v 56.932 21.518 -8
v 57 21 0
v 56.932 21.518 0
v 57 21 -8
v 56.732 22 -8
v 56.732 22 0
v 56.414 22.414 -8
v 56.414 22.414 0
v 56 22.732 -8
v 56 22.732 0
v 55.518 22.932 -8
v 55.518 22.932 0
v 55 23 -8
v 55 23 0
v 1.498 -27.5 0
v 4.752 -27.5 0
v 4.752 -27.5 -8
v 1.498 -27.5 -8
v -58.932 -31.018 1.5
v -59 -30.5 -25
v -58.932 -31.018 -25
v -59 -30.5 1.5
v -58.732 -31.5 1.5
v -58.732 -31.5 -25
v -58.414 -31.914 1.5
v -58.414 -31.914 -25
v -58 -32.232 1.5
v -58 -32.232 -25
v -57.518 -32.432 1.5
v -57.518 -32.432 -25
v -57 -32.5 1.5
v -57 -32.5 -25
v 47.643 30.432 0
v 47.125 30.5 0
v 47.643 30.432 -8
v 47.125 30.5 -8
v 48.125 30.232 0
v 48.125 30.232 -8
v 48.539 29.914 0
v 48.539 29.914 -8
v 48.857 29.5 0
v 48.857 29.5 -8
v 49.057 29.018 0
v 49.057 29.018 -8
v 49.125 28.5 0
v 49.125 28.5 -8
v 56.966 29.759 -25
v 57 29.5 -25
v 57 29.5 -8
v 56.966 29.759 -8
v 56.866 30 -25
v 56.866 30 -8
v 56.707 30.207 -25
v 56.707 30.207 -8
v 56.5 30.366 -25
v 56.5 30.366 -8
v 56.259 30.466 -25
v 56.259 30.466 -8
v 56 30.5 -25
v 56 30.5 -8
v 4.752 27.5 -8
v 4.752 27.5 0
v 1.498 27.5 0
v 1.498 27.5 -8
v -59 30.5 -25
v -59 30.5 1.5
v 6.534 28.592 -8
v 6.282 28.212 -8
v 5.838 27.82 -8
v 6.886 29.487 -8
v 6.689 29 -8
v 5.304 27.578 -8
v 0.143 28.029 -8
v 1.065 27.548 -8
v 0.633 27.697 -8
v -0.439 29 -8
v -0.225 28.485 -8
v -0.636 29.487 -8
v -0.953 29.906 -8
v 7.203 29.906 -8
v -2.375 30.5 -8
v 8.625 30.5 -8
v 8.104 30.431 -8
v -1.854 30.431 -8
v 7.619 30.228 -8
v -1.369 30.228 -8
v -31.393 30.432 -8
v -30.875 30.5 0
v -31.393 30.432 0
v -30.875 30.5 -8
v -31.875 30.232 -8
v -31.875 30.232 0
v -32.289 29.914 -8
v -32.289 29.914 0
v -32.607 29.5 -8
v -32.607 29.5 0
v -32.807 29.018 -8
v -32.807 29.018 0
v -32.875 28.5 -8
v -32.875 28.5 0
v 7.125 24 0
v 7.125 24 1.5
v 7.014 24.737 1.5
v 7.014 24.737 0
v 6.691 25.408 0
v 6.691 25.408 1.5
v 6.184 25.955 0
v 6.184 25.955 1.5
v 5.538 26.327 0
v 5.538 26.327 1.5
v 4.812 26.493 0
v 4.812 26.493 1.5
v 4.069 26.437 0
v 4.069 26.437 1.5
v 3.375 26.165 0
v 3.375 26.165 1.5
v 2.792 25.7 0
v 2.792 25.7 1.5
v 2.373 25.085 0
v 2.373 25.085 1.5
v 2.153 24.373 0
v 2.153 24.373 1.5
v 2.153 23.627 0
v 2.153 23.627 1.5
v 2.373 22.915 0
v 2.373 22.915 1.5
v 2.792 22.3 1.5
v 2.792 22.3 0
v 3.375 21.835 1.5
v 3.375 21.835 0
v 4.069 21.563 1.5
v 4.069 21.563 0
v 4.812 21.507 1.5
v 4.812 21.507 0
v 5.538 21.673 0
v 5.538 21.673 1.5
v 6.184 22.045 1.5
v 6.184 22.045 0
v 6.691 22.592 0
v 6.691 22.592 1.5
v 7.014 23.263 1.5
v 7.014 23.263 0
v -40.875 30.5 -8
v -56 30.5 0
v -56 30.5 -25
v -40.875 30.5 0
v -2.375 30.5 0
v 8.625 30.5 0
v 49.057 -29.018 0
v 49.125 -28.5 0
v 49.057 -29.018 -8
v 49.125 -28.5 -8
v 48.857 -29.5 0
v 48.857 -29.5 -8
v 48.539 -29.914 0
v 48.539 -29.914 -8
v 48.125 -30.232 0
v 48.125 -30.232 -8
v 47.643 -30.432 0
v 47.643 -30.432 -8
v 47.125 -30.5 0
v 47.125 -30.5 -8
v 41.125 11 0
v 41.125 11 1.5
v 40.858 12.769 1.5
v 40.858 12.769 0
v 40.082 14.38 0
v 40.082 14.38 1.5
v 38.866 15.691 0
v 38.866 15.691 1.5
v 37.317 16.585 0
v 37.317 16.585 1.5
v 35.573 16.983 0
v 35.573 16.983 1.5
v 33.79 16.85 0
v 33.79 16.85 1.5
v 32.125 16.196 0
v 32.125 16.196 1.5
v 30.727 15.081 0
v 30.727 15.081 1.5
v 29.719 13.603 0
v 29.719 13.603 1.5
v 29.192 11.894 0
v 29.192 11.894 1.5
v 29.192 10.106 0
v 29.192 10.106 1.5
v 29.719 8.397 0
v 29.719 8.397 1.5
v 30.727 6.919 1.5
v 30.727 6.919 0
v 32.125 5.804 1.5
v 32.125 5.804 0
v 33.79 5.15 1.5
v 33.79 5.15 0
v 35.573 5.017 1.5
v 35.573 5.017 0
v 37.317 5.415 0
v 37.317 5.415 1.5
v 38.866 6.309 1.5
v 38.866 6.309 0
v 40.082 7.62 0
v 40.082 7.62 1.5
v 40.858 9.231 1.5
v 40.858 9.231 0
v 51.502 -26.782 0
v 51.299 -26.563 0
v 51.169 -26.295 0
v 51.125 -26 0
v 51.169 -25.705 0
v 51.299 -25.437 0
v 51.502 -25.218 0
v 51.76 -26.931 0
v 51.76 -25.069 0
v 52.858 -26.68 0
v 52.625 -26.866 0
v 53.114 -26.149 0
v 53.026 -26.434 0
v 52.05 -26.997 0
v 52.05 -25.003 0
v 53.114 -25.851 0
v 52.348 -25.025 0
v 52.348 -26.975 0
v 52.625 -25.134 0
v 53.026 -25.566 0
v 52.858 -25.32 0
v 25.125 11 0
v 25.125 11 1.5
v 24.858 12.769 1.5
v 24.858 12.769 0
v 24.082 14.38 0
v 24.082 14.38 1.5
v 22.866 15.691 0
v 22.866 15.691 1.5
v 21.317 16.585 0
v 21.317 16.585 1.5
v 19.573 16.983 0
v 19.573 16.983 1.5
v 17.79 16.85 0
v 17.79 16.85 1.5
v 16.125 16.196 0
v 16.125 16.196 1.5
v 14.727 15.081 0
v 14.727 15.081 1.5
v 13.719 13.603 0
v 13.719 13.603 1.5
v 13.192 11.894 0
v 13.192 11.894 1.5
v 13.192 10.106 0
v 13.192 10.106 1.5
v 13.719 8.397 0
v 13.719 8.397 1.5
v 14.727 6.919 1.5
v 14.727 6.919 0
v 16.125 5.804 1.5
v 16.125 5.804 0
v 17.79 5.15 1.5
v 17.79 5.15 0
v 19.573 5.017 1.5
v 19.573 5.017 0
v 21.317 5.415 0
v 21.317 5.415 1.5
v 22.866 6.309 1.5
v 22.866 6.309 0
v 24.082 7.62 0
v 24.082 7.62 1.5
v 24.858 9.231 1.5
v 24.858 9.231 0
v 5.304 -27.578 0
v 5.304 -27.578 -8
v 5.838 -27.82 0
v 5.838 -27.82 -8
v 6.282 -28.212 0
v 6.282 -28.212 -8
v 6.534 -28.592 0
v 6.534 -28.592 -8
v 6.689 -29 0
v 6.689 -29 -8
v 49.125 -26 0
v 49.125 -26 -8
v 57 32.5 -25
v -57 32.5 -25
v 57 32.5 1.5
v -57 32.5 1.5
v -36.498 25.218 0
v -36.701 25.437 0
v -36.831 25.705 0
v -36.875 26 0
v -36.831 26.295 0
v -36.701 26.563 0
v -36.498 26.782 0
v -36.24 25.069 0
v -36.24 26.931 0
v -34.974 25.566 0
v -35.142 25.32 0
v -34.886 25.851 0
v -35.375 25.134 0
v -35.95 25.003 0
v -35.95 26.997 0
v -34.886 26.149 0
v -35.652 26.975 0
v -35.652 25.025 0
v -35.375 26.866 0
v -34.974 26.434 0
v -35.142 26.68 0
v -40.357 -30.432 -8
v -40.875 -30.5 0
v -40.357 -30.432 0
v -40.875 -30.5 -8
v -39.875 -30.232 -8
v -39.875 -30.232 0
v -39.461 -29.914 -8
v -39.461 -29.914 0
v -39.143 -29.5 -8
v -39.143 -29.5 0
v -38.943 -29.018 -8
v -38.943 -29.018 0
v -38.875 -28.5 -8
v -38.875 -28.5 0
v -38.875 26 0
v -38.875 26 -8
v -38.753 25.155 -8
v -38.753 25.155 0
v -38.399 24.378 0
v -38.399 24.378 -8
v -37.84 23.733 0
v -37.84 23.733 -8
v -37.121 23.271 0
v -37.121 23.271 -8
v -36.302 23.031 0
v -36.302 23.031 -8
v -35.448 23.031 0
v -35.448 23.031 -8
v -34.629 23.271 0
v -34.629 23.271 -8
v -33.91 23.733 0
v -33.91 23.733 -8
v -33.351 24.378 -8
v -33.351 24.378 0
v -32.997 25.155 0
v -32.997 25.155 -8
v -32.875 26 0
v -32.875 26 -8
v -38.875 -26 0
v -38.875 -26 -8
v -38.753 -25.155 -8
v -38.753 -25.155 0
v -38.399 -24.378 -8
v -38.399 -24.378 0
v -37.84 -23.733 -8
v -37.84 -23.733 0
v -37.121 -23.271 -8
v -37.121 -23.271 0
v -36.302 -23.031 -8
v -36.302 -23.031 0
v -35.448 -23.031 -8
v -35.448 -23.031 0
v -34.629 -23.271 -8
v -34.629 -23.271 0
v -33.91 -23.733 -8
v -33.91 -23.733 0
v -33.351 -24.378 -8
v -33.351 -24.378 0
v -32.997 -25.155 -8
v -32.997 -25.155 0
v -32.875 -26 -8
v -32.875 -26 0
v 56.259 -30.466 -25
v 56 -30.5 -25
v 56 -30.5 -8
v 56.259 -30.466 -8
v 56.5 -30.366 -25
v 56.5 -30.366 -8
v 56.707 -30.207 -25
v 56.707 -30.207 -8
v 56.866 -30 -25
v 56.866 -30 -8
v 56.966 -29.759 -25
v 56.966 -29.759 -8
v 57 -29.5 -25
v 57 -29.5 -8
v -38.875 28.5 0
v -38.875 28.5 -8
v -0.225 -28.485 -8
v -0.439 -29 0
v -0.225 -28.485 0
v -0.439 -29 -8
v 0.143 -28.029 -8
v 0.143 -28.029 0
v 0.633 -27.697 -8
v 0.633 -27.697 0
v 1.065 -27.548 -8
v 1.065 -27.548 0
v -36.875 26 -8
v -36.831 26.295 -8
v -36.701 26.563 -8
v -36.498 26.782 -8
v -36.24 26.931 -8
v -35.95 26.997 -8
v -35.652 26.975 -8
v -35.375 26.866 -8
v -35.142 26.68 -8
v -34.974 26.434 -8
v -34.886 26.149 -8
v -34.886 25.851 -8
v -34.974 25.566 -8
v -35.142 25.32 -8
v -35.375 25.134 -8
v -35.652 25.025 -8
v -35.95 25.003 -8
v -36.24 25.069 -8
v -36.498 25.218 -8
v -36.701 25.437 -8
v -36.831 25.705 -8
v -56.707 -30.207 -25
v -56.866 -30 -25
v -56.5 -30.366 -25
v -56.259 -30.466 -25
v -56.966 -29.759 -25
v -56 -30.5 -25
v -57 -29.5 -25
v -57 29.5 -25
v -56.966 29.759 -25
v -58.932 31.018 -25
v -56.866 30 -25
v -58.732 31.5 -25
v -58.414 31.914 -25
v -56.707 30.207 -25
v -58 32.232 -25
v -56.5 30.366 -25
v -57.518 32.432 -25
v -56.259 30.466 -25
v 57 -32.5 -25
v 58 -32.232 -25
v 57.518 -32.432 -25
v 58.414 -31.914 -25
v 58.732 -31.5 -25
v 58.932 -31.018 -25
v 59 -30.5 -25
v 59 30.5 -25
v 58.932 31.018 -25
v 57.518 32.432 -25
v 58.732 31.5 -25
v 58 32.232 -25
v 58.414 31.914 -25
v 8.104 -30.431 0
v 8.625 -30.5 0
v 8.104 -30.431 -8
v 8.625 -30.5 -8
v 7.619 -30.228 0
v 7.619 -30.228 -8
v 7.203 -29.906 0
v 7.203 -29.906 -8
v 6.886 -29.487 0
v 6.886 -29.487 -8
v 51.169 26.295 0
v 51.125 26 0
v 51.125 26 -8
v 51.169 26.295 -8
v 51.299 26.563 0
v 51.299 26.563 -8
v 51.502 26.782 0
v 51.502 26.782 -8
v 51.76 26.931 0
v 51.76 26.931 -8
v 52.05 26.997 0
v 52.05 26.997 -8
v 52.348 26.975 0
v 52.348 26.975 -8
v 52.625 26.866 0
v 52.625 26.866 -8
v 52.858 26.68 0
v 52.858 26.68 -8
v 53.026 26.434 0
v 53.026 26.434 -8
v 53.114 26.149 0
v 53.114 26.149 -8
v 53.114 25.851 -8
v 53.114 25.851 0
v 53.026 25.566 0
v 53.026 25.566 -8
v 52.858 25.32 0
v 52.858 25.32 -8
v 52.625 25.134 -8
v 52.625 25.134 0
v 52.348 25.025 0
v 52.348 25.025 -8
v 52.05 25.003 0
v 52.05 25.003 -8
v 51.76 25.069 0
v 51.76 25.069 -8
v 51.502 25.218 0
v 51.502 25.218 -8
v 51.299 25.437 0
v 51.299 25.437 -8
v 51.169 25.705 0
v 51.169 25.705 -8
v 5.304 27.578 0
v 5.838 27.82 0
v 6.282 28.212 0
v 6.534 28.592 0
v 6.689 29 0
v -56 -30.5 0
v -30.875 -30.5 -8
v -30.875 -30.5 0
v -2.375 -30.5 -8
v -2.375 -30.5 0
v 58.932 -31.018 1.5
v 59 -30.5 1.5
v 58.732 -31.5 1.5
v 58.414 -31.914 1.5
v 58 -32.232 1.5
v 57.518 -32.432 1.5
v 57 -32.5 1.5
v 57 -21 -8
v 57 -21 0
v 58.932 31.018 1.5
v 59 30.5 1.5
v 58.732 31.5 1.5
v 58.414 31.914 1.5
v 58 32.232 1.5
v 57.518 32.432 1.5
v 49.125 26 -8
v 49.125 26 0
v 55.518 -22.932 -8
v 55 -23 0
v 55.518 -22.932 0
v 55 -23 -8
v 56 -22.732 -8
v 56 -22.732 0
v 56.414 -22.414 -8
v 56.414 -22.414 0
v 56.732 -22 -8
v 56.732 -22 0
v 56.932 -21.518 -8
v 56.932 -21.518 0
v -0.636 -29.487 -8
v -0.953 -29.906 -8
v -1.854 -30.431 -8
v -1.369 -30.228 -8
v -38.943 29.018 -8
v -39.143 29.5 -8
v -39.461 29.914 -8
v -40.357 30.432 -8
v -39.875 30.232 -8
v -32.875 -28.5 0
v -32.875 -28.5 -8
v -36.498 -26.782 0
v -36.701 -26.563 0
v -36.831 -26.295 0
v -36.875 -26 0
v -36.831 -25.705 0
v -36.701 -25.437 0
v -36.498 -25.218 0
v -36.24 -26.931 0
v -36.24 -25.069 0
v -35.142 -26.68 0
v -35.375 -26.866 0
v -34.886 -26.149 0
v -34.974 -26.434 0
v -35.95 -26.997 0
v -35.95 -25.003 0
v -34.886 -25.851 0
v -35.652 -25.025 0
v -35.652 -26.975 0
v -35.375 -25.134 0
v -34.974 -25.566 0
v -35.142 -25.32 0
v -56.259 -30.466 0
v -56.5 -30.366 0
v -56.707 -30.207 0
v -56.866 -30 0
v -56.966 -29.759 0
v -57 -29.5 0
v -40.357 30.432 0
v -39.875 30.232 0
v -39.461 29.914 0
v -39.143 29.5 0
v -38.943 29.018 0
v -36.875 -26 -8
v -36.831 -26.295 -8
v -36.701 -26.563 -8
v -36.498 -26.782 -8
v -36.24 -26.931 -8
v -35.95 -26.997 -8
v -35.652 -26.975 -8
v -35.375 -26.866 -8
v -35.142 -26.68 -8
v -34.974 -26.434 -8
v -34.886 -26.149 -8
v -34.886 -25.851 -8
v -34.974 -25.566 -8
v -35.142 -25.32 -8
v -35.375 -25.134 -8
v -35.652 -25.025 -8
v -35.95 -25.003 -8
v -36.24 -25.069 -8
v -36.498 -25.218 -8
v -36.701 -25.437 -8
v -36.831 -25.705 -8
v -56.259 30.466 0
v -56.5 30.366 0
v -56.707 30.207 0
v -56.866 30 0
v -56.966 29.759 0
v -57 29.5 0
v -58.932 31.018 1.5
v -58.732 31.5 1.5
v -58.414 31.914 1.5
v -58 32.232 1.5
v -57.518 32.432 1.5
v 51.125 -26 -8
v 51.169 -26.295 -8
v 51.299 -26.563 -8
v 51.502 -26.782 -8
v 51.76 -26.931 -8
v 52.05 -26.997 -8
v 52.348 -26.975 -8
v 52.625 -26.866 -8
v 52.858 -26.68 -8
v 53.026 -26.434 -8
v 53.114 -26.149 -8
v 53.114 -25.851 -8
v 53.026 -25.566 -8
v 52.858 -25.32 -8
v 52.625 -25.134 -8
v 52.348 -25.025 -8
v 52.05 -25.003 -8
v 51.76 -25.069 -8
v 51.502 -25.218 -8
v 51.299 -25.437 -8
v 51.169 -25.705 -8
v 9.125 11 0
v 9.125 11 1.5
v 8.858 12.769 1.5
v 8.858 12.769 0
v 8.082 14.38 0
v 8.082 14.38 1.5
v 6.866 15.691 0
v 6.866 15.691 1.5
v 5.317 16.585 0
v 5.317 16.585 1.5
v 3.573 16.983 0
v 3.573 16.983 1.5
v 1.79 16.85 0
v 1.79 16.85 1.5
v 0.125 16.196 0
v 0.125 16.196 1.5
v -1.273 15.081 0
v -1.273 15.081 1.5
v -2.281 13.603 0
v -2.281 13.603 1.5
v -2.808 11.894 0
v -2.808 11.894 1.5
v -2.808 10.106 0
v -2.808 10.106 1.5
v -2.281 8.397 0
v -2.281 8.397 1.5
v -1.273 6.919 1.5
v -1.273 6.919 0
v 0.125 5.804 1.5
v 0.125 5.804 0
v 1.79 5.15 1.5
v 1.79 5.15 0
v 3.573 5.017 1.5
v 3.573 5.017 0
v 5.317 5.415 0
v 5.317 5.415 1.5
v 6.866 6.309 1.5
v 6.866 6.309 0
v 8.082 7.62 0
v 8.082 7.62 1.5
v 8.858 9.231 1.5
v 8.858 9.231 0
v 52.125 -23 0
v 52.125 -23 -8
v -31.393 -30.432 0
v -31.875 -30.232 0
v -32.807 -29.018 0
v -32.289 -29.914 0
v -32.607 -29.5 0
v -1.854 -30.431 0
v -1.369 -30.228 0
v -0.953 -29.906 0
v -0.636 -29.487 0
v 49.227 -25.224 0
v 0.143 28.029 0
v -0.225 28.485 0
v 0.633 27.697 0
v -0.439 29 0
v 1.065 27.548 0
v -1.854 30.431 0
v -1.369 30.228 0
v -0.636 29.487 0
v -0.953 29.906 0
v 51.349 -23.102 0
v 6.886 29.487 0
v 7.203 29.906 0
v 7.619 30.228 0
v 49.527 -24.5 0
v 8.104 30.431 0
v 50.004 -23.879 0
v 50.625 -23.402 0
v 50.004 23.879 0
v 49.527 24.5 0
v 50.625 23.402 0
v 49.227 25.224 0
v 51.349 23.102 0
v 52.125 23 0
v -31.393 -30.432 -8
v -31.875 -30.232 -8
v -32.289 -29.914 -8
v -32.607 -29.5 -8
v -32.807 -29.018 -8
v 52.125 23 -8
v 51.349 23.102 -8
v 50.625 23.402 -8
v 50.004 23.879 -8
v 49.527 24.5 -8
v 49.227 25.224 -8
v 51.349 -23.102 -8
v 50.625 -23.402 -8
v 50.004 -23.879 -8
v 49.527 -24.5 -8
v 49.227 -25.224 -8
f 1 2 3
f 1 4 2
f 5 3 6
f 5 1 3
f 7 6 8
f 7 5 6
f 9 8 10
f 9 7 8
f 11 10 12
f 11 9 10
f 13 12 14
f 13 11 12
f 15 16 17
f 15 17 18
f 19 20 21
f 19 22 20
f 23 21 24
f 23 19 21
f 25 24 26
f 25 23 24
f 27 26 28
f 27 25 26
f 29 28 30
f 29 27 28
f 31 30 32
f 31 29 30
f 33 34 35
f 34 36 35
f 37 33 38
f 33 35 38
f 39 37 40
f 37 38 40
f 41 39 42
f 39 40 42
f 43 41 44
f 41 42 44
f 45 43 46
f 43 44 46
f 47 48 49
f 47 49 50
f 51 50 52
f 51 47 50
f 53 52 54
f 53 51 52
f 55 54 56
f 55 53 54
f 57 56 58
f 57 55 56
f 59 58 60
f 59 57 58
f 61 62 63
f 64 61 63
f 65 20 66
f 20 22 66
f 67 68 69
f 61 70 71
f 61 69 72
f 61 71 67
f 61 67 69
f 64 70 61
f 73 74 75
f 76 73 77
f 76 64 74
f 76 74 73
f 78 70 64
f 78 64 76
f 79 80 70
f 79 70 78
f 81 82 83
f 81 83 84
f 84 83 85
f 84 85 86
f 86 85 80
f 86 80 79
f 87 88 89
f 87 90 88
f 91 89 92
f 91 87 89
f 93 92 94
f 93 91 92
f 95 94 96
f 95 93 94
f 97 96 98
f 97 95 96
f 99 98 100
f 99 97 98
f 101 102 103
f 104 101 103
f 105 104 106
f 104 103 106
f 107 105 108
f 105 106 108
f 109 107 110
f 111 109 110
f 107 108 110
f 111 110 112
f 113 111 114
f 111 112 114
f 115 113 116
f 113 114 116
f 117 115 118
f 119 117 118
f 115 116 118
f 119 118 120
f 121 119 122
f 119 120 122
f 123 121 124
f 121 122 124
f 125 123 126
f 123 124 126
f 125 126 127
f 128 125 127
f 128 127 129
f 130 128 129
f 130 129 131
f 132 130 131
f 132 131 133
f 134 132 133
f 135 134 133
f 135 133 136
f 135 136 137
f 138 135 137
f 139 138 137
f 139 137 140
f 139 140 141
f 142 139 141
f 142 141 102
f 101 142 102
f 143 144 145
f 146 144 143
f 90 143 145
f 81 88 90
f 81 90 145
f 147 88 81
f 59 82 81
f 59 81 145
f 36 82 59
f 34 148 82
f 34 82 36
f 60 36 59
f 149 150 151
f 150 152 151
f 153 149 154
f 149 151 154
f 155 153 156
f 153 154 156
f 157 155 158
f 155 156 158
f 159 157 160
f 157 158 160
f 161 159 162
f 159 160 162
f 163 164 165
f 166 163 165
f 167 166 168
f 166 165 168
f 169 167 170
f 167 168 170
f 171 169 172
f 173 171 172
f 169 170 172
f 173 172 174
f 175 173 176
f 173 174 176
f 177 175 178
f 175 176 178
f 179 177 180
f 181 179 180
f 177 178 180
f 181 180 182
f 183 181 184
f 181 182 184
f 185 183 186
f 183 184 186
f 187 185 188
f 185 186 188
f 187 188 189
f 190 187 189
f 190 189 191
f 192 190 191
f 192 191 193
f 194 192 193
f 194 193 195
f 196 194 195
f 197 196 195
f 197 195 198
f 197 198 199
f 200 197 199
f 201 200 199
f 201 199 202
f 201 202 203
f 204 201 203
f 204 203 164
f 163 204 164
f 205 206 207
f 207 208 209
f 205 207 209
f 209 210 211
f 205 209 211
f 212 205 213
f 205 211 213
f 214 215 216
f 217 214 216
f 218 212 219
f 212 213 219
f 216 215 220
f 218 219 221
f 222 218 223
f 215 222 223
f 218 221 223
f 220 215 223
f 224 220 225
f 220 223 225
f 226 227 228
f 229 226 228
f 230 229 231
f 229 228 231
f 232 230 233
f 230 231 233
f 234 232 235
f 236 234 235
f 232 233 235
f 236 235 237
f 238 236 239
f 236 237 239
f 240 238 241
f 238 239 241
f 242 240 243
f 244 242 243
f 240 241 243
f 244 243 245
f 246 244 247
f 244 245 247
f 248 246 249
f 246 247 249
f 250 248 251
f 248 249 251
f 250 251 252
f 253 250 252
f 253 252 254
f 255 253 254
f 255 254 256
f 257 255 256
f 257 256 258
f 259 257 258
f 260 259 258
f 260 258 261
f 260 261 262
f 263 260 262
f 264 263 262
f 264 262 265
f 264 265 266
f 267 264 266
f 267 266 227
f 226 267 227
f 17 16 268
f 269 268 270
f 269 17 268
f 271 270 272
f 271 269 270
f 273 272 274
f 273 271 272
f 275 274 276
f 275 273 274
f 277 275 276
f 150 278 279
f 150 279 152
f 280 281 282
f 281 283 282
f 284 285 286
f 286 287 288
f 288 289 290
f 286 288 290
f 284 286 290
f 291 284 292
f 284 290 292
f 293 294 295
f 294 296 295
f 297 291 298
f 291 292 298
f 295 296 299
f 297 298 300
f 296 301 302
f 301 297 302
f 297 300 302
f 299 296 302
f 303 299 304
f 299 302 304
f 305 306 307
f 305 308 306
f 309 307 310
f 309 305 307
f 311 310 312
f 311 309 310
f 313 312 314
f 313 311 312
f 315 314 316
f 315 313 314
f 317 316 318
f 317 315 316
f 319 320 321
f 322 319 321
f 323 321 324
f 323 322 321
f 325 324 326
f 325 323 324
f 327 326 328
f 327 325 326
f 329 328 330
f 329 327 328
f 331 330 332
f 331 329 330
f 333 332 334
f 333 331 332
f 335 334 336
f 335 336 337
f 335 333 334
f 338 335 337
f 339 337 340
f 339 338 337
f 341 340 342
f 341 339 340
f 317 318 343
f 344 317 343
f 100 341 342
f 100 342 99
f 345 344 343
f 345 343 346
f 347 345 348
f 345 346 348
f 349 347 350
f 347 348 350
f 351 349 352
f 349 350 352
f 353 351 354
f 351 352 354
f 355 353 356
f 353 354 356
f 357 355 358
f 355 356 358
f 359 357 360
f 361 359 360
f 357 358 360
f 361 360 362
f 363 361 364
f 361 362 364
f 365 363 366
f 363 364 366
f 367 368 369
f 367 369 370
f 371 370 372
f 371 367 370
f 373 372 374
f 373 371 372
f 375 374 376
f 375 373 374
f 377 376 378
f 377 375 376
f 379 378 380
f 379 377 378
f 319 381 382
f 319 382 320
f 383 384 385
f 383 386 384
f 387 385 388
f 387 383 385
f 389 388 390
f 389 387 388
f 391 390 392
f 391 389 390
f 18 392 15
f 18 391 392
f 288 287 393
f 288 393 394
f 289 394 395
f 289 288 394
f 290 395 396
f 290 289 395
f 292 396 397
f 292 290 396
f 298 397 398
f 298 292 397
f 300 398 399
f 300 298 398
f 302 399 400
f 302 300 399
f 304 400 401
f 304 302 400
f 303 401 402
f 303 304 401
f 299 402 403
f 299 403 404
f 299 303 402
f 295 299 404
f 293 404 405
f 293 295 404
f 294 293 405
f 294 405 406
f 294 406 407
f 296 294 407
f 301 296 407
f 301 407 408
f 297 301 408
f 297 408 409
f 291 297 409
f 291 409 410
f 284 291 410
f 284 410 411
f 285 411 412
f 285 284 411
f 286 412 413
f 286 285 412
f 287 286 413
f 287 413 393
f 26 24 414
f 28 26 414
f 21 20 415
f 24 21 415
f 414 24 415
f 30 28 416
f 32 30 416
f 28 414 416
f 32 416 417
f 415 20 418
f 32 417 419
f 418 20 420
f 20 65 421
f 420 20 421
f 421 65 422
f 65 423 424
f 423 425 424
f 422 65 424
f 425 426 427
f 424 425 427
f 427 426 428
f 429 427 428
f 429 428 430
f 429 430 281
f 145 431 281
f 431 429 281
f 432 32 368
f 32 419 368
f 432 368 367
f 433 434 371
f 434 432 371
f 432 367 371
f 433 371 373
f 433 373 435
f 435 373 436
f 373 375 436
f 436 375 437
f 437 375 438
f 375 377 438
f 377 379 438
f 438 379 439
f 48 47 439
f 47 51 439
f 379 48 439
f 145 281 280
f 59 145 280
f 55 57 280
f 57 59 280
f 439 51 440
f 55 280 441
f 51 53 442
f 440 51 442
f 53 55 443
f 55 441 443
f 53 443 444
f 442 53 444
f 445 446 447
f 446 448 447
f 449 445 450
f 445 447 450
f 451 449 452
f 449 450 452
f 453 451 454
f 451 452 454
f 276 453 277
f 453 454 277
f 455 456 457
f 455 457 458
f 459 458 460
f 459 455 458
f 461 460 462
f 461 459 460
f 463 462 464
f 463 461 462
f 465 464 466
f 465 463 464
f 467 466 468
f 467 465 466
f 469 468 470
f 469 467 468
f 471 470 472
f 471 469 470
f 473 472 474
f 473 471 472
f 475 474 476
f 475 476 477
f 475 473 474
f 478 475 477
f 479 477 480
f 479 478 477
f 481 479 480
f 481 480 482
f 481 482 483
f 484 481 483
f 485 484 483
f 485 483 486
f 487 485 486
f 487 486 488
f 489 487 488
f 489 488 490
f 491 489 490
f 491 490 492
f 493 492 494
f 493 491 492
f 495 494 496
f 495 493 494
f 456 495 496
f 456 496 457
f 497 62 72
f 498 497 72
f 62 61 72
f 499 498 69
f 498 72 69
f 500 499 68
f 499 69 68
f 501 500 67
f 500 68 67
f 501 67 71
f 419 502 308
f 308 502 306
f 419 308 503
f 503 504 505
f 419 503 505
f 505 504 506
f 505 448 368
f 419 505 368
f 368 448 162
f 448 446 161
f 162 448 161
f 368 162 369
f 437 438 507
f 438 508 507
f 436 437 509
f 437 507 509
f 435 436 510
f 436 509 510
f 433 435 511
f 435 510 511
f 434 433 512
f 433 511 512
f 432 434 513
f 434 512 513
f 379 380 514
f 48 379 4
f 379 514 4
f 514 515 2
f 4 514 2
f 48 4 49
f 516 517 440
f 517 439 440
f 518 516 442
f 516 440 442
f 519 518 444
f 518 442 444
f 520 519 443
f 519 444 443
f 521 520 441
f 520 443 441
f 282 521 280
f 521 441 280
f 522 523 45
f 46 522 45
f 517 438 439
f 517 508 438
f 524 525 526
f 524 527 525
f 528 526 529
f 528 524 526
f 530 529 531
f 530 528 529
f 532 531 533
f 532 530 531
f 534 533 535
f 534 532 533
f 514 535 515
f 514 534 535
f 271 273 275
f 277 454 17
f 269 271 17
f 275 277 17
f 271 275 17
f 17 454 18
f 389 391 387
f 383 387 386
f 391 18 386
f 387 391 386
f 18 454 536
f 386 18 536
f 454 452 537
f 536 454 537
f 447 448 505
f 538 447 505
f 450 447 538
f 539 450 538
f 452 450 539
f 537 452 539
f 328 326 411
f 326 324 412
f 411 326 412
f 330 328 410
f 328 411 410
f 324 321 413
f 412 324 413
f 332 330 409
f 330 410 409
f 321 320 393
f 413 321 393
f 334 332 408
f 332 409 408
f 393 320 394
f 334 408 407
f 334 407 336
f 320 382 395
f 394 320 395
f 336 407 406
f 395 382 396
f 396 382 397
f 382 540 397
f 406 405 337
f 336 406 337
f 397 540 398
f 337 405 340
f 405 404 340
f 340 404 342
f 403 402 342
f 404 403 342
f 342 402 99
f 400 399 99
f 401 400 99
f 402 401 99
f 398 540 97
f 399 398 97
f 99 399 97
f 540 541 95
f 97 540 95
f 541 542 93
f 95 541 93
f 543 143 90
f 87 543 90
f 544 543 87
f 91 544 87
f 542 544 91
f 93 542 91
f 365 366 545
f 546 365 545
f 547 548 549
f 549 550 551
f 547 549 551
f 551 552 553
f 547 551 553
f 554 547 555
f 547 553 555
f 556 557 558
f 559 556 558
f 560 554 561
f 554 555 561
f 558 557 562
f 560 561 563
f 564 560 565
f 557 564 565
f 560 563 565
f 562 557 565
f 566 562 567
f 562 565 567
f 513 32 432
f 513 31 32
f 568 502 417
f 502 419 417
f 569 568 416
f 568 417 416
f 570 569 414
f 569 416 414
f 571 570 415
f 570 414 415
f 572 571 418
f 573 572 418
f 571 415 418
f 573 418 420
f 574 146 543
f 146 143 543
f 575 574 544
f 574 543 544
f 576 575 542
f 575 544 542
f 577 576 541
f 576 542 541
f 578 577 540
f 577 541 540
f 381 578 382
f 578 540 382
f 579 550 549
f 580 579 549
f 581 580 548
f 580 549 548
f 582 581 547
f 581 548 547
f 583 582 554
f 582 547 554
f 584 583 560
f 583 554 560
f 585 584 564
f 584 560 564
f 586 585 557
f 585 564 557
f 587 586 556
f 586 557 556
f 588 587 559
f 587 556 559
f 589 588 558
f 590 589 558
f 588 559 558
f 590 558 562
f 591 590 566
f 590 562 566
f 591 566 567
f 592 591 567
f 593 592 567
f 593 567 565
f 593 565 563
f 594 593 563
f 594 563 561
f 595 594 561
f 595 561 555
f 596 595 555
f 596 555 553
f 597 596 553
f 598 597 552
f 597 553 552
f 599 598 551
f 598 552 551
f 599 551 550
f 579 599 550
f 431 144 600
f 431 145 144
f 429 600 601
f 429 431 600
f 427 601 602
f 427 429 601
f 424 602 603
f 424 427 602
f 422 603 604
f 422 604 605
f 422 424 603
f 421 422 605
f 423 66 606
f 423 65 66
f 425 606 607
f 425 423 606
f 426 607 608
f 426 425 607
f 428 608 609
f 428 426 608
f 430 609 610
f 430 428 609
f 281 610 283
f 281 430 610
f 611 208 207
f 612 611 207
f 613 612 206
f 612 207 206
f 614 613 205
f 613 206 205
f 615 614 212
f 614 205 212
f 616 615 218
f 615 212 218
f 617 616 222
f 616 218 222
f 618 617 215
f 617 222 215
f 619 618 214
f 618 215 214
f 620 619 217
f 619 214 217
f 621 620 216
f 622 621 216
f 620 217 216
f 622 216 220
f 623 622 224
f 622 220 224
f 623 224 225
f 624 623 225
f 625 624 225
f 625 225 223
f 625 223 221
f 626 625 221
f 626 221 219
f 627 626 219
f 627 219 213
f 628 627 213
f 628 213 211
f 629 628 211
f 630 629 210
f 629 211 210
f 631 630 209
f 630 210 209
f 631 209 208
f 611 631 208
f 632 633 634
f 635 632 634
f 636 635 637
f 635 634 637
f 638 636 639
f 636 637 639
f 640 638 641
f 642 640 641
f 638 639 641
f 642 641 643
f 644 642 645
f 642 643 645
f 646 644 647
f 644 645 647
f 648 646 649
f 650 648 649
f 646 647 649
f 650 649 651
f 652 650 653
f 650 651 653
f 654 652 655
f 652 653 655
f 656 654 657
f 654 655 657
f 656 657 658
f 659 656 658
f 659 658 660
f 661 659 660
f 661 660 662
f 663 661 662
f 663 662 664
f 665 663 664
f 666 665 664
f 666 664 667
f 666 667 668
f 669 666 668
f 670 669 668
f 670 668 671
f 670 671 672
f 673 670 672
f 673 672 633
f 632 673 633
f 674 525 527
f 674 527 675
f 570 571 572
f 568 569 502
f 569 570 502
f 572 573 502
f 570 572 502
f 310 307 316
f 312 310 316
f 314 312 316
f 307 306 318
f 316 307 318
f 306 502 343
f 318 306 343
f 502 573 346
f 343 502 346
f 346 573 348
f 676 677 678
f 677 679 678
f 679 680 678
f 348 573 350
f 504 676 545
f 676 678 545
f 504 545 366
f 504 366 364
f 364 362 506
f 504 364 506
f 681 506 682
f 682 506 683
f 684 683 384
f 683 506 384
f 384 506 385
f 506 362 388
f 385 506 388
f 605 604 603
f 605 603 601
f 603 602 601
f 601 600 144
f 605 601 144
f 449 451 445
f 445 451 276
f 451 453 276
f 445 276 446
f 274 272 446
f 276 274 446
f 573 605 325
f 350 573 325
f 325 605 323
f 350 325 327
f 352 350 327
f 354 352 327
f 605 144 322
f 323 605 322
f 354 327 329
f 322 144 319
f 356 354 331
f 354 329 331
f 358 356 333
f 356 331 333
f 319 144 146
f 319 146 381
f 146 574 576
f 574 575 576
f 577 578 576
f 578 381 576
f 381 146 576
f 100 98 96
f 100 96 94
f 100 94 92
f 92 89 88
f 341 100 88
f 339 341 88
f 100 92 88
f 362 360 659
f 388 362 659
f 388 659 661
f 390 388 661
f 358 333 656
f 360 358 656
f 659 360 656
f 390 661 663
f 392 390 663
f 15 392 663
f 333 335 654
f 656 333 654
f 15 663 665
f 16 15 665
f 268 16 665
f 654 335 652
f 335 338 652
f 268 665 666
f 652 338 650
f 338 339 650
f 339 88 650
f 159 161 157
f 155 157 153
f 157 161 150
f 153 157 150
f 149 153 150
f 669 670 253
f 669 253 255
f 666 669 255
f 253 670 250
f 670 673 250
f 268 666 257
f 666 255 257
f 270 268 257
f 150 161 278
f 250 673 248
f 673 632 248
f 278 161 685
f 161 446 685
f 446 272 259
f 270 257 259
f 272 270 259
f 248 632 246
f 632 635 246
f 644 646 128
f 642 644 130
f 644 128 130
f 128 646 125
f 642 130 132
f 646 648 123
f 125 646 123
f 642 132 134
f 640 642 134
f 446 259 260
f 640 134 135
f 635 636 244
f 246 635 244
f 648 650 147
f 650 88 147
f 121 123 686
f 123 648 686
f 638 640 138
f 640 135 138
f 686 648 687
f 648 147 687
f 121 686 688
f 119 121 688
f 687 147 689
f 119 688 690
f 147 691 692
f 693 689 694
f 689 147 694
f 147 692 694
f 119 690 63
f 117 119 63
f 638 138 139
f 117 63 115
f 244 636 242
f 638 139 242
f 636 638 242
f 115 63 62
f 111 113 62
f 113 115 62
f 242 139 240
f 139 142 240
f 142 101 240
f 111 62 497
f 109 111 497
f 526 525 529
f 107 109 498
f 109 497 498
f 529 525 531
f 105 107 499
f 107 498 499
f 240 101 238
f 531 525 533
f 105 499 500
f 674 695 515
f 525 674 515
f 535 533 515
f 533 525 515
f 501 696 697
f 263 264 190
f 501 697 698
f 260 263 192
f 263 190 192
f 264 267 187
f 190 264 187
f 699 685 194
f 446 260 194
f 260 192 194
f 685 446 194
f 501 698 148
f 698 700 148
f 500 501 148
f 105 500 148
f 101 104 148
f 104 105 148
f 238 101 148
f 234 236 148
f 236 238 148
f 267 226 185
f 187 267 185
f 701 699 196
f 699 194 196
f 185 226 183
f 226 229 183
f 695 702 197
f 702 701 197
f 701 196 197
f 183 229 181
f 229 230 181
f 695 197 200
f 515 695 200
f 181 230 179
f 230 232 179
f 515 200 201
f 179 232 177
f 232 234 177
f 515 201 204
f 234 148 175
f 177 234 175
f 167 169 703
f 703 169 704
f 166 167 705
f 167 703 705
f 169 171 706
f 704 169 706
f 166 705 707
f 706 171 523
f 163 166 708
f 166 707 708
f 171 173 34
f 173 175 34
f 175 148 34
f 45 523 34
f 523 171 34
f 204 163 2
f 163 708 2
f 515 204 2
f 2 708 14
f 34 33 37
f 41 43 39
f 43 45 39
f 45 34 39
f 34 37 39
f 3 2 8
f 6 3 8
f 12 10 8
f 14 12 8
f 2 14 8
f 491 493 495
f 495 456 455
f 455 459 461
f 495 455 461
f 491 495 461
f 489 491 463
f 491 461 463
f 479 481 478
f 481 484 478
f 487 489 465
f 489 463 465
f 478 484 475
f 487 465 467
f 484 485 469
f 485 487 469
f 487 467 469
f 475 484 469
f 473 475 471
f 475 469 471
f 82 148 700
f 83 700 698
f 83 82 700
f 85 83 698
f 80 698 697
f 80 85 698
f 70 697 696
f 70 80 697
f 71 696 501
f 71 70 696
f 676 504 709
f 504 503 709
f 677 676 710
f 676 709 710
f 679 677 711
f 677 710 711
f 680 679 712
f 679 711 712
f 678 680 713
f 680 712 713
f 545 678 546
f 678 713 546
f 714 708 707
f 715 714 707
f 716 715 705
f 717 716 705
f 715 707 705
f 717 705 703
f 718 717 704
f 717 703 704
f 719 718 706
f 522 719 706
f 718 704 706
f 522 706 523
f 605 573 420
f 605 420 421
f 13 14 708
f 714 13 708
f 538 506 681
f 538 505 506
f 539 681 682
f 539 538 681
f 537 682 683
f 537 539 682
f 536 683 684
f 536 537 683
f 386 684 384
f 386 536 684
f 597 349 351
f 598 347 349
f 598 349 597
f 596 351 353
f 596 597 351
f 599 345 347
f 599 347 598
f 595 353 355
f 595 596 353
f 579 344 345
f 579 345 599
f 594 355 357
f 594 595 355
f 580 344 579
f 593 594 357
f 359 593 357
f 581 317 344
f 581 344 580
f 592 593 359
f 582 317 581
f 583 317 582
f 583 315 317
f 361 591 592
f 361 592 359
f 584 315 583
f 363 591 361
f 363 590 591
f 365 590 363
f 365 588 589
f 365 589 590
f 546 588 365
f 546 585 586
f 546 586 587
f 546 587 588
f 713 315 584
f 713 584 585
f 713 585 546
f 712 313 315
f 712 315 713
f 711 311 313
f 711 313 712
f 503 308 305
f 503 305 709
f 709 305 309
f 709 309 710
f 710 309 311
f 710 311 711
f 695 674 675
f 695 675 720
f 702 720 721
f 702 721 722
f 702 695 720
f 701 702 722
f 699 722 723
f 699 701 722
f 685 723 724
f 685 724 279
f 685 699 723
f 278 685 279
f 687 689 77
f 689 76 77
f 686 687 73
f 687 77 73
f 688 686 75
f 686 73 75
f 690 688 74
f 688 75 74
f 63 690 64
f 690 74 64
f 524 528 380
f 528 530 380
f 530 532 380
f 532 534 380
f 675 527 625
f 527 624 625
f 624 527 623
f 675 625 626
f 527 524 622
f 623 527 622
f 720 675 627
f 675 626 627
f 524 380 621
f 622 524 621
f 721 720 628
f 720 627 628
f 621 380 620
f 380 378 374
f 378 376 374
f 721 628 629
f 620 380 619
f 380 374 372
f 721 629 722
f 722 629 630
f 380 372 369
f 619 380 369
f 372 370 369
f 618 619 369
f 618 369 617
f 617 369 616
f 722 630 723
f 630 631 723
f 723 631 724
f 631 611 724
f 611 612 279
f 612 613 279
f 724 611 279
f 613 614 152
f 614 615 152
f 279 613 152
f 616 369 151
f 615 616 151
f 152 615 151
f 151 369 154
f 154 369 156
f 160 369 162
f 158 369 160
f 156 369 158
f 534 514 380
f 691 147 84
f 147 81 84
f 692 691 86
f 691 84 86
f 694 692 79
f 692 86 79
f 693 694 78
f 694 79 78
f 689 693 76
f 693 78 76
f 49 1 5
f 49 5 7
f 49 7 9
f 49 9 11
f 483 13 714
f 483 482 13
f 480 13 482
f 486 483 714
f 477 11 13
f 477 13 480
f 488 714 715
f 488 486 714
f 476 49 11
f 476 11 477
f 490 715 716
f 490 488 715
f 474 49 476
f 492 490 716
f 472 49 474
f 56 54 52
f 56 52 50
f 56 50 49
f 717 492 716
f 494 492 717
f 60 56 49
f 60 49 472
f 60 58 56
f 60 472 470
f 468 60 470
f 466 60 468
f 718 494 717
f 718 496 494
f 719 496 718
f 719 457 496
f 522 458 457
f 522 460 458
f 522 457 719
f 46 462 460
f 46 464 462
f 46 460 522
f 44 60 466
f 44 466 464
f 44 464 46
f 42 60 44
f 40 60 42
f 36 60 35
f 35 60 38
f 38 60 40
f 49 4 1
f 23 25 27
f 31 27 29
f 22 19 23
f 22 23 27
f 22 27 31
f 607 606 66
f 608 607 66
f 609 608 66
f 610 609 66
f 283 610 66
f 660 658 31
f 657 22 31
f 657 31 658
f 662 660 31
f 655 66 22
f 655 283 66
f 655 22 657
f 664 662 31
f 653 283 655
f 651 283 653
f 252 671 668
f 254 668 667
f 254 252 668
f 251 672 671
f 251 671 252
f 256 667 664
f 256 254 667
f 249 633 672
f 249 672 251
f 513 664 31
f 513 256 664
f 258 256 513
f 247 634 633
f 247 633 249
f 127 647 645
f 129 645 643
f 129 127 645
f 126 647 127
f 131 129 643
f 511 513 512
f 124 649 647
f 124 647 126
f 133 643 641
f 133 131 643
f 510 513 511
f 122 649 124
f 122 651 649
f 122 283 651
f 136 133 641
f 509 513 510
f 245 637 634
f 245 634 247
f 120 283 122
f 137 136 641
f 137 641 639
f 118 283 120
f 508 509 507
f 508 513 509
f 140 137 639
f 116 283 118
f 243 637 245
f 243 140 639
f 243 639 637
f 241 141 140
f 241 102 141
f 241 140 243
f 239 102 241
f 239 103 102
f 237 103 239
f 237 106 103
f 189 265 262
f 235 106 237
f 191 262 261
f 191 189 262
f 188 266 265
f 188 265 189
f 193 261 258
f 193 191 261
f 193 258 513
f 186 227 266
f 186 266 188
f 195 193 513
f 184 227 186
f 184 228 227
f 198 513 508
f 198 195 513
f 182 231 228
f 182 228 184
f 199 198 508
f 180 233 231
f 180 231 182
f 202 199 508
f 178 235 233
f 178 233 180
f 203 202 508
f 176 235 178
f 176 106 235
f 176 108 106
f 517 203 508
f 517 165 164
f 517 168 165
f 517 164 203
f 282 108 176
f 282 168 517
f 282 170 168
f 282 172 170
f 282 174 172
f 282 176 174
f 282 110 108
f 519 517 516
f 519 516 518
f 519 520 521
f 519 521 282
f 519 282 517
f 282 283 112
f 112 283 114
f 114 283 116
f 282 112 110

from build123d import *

# Parameters (mm, degrees)
SKETCH2_W           = 118
SKETCH2_H           = 65
BOSS_EXTRUDE2_DEPTH = 1.5
SKETCH4_W           = 118
SKETCH4_H           = 65
SKETCH4_W_2         = 114
SKETCH4_H_2         = 61
BOSS_EXTRUDE3_DEPTH = 25
FILLET2_R           = 2
FILLET3_R           = 1
SKETCH5_R           = 6
SKETCH5_R_2         = 2.5
CUT_EXTRUDE1_DEPTH  = 27.5
SKETCH6_R           = 1
SKETCH6_W           = 7
SKETCH6_H           = 3
BOSS_EXTRUDE4_DEPTH = 8
FILLET4_R           = 2
FILLET6_R           = 2


with BuildPart() as part:
    # Sketch2 → Boss-Extrude2 (new body)
    with BuildSketch(Plane.XY):
        Rectangle(SKETCH2_W, SKETCH2_H)
    extrude(amount=BOSS_EXTRUDE2_DEPTH)

    # Sketch4 → Boss-Extrude3 (add)
    with BuildSketch(Plane.XY):
        Rectangle(SKETCH4_W, SKETCH4_H)
        Rectangle(SKETCH4_W_2, SKETCH4_H_2, mode=Mode.SUBTRACT)
    extrude(amount=-BOSS_EXTRUDE3_DEPTH)

    # Fillet2
    fillet2_edges = [part.edges().sort_by_distance(p)[0] for p in [
        (59, 32.5, -11.75),
        (59, -32.5, -11.75),
        (-59, -32.5, -11.75),
        (-59, 32.5, -11.75),
    ]]
    fillet(fillet2_edges, radius=FILLET2_R)

    # Fillet3
    fillet3_edges = [part.edges().sort_by_distance(p)[0] for p in [
        (-57, -30.5, -12.5),
        (-57, 30.5, -12.5),
        (57, 30.5, -12.5),
        (57, -30.5, -12.5),
    ]]
    fillet(fillet3_edges, radius=FILLET3_R)

    # Sketch5 → Cut-Extrude1 (cut, through all)
    with BuildSketch(Plane.XY.offset(1.5)):
        with Locations((35.125, 11)):
            Circle(SKETCH5_R)
        with Locations((19.125, 11)):
            Circle(SKETCH5_R)
        with Locations((3.125, 11)):
            Circle(SKETCH5_R)
        with Locations((4.625, 24)):
            Circle(SKETCH5_R_2)
    extrude(amount=-CUT_EXTRUDE1_DEPTH, mode=Mode.SUBTRACT)

    # Sketch6 → Boss-Extrude4 (add)
    with BuildSketch(Plane(origin=(0, 0, 0), x_dir=(-1, 0, 0), z_dir=(0, 0, -1))):
        with BuildLine():
            Line((-57, 30.5), (-57, 23))
            Line((-57, 23), (-52.125, 23))
            ThreePointArc((-52.125, 23), (-50.003679656, 23.878679656), (-49.125, 26))
            Line((-49.125, 26), (-49.125, 30.5))
            Line((-49.125, 30.5), (-57, 30.5))
        make_face()
        with Locations((-52.125, 26)):
            Circle(SKETCH6_R, mode=Mode.SUBTRACT)
        with BuildLine():
            Line((32.875, 30.5), (38.875, 30.5))
            Line((38.875, 30.5), (38.875, 26))
            ThreePointArc((38.875, 26), (35.875, 23), (32.875, 26))
            Line((32.875, 26), (32.875, 30.5))
        make_face()
        with Locations((35.875, 26)):
            Circle(SKETCH6_R, mode=Mode.SUBTRACT)
        with Locations((-3.125, 29)):
            Rectangle(SKETCH6_W, SKETCH6_H)
    boss_extrude4 = extrude(amount=BOSS_EXTRUDE4_DEPTH)

    # Mirror1: Boss-Extrude4 across plane
    add(boss_extrude4.mirror(Plane.ZX))

    # Fillet4
    fillet4_edges = [part.edges().sort_by_distance(p)[0] for p in [
        (49.125, 30.5, -4),
        (57, 23, -4),
        (-32.875, 30.5, -4),
        (-38.875, 30.5, -4),
        (-0.375, 30.5, -4),
        (6.625, 30.5, -4),
        (57, -23, -4),
        (49.125, -30.5, -4),
        (-32.875, -30.5, -4),
        (-38.875, -30.5, -4),
        (-0.375, -30.5, -4),
        (6.625, -30.5, -4),
    ]]
    fillet(fillet4_edges, radius=FILLET4_R)

    # Fillet6
    fillet6_edges = [part.edges().sort_by_distance(p)[0] for p in [
        (-0.375, 27.5, -4),
        (6.625, 27.5, -4),
        (6.625, -27.5, -4),
        (-0.375, -27.5, -4),
    ]]
    fillet(fillet6_edges, radius=FILLET6_R)


solid = part.part
